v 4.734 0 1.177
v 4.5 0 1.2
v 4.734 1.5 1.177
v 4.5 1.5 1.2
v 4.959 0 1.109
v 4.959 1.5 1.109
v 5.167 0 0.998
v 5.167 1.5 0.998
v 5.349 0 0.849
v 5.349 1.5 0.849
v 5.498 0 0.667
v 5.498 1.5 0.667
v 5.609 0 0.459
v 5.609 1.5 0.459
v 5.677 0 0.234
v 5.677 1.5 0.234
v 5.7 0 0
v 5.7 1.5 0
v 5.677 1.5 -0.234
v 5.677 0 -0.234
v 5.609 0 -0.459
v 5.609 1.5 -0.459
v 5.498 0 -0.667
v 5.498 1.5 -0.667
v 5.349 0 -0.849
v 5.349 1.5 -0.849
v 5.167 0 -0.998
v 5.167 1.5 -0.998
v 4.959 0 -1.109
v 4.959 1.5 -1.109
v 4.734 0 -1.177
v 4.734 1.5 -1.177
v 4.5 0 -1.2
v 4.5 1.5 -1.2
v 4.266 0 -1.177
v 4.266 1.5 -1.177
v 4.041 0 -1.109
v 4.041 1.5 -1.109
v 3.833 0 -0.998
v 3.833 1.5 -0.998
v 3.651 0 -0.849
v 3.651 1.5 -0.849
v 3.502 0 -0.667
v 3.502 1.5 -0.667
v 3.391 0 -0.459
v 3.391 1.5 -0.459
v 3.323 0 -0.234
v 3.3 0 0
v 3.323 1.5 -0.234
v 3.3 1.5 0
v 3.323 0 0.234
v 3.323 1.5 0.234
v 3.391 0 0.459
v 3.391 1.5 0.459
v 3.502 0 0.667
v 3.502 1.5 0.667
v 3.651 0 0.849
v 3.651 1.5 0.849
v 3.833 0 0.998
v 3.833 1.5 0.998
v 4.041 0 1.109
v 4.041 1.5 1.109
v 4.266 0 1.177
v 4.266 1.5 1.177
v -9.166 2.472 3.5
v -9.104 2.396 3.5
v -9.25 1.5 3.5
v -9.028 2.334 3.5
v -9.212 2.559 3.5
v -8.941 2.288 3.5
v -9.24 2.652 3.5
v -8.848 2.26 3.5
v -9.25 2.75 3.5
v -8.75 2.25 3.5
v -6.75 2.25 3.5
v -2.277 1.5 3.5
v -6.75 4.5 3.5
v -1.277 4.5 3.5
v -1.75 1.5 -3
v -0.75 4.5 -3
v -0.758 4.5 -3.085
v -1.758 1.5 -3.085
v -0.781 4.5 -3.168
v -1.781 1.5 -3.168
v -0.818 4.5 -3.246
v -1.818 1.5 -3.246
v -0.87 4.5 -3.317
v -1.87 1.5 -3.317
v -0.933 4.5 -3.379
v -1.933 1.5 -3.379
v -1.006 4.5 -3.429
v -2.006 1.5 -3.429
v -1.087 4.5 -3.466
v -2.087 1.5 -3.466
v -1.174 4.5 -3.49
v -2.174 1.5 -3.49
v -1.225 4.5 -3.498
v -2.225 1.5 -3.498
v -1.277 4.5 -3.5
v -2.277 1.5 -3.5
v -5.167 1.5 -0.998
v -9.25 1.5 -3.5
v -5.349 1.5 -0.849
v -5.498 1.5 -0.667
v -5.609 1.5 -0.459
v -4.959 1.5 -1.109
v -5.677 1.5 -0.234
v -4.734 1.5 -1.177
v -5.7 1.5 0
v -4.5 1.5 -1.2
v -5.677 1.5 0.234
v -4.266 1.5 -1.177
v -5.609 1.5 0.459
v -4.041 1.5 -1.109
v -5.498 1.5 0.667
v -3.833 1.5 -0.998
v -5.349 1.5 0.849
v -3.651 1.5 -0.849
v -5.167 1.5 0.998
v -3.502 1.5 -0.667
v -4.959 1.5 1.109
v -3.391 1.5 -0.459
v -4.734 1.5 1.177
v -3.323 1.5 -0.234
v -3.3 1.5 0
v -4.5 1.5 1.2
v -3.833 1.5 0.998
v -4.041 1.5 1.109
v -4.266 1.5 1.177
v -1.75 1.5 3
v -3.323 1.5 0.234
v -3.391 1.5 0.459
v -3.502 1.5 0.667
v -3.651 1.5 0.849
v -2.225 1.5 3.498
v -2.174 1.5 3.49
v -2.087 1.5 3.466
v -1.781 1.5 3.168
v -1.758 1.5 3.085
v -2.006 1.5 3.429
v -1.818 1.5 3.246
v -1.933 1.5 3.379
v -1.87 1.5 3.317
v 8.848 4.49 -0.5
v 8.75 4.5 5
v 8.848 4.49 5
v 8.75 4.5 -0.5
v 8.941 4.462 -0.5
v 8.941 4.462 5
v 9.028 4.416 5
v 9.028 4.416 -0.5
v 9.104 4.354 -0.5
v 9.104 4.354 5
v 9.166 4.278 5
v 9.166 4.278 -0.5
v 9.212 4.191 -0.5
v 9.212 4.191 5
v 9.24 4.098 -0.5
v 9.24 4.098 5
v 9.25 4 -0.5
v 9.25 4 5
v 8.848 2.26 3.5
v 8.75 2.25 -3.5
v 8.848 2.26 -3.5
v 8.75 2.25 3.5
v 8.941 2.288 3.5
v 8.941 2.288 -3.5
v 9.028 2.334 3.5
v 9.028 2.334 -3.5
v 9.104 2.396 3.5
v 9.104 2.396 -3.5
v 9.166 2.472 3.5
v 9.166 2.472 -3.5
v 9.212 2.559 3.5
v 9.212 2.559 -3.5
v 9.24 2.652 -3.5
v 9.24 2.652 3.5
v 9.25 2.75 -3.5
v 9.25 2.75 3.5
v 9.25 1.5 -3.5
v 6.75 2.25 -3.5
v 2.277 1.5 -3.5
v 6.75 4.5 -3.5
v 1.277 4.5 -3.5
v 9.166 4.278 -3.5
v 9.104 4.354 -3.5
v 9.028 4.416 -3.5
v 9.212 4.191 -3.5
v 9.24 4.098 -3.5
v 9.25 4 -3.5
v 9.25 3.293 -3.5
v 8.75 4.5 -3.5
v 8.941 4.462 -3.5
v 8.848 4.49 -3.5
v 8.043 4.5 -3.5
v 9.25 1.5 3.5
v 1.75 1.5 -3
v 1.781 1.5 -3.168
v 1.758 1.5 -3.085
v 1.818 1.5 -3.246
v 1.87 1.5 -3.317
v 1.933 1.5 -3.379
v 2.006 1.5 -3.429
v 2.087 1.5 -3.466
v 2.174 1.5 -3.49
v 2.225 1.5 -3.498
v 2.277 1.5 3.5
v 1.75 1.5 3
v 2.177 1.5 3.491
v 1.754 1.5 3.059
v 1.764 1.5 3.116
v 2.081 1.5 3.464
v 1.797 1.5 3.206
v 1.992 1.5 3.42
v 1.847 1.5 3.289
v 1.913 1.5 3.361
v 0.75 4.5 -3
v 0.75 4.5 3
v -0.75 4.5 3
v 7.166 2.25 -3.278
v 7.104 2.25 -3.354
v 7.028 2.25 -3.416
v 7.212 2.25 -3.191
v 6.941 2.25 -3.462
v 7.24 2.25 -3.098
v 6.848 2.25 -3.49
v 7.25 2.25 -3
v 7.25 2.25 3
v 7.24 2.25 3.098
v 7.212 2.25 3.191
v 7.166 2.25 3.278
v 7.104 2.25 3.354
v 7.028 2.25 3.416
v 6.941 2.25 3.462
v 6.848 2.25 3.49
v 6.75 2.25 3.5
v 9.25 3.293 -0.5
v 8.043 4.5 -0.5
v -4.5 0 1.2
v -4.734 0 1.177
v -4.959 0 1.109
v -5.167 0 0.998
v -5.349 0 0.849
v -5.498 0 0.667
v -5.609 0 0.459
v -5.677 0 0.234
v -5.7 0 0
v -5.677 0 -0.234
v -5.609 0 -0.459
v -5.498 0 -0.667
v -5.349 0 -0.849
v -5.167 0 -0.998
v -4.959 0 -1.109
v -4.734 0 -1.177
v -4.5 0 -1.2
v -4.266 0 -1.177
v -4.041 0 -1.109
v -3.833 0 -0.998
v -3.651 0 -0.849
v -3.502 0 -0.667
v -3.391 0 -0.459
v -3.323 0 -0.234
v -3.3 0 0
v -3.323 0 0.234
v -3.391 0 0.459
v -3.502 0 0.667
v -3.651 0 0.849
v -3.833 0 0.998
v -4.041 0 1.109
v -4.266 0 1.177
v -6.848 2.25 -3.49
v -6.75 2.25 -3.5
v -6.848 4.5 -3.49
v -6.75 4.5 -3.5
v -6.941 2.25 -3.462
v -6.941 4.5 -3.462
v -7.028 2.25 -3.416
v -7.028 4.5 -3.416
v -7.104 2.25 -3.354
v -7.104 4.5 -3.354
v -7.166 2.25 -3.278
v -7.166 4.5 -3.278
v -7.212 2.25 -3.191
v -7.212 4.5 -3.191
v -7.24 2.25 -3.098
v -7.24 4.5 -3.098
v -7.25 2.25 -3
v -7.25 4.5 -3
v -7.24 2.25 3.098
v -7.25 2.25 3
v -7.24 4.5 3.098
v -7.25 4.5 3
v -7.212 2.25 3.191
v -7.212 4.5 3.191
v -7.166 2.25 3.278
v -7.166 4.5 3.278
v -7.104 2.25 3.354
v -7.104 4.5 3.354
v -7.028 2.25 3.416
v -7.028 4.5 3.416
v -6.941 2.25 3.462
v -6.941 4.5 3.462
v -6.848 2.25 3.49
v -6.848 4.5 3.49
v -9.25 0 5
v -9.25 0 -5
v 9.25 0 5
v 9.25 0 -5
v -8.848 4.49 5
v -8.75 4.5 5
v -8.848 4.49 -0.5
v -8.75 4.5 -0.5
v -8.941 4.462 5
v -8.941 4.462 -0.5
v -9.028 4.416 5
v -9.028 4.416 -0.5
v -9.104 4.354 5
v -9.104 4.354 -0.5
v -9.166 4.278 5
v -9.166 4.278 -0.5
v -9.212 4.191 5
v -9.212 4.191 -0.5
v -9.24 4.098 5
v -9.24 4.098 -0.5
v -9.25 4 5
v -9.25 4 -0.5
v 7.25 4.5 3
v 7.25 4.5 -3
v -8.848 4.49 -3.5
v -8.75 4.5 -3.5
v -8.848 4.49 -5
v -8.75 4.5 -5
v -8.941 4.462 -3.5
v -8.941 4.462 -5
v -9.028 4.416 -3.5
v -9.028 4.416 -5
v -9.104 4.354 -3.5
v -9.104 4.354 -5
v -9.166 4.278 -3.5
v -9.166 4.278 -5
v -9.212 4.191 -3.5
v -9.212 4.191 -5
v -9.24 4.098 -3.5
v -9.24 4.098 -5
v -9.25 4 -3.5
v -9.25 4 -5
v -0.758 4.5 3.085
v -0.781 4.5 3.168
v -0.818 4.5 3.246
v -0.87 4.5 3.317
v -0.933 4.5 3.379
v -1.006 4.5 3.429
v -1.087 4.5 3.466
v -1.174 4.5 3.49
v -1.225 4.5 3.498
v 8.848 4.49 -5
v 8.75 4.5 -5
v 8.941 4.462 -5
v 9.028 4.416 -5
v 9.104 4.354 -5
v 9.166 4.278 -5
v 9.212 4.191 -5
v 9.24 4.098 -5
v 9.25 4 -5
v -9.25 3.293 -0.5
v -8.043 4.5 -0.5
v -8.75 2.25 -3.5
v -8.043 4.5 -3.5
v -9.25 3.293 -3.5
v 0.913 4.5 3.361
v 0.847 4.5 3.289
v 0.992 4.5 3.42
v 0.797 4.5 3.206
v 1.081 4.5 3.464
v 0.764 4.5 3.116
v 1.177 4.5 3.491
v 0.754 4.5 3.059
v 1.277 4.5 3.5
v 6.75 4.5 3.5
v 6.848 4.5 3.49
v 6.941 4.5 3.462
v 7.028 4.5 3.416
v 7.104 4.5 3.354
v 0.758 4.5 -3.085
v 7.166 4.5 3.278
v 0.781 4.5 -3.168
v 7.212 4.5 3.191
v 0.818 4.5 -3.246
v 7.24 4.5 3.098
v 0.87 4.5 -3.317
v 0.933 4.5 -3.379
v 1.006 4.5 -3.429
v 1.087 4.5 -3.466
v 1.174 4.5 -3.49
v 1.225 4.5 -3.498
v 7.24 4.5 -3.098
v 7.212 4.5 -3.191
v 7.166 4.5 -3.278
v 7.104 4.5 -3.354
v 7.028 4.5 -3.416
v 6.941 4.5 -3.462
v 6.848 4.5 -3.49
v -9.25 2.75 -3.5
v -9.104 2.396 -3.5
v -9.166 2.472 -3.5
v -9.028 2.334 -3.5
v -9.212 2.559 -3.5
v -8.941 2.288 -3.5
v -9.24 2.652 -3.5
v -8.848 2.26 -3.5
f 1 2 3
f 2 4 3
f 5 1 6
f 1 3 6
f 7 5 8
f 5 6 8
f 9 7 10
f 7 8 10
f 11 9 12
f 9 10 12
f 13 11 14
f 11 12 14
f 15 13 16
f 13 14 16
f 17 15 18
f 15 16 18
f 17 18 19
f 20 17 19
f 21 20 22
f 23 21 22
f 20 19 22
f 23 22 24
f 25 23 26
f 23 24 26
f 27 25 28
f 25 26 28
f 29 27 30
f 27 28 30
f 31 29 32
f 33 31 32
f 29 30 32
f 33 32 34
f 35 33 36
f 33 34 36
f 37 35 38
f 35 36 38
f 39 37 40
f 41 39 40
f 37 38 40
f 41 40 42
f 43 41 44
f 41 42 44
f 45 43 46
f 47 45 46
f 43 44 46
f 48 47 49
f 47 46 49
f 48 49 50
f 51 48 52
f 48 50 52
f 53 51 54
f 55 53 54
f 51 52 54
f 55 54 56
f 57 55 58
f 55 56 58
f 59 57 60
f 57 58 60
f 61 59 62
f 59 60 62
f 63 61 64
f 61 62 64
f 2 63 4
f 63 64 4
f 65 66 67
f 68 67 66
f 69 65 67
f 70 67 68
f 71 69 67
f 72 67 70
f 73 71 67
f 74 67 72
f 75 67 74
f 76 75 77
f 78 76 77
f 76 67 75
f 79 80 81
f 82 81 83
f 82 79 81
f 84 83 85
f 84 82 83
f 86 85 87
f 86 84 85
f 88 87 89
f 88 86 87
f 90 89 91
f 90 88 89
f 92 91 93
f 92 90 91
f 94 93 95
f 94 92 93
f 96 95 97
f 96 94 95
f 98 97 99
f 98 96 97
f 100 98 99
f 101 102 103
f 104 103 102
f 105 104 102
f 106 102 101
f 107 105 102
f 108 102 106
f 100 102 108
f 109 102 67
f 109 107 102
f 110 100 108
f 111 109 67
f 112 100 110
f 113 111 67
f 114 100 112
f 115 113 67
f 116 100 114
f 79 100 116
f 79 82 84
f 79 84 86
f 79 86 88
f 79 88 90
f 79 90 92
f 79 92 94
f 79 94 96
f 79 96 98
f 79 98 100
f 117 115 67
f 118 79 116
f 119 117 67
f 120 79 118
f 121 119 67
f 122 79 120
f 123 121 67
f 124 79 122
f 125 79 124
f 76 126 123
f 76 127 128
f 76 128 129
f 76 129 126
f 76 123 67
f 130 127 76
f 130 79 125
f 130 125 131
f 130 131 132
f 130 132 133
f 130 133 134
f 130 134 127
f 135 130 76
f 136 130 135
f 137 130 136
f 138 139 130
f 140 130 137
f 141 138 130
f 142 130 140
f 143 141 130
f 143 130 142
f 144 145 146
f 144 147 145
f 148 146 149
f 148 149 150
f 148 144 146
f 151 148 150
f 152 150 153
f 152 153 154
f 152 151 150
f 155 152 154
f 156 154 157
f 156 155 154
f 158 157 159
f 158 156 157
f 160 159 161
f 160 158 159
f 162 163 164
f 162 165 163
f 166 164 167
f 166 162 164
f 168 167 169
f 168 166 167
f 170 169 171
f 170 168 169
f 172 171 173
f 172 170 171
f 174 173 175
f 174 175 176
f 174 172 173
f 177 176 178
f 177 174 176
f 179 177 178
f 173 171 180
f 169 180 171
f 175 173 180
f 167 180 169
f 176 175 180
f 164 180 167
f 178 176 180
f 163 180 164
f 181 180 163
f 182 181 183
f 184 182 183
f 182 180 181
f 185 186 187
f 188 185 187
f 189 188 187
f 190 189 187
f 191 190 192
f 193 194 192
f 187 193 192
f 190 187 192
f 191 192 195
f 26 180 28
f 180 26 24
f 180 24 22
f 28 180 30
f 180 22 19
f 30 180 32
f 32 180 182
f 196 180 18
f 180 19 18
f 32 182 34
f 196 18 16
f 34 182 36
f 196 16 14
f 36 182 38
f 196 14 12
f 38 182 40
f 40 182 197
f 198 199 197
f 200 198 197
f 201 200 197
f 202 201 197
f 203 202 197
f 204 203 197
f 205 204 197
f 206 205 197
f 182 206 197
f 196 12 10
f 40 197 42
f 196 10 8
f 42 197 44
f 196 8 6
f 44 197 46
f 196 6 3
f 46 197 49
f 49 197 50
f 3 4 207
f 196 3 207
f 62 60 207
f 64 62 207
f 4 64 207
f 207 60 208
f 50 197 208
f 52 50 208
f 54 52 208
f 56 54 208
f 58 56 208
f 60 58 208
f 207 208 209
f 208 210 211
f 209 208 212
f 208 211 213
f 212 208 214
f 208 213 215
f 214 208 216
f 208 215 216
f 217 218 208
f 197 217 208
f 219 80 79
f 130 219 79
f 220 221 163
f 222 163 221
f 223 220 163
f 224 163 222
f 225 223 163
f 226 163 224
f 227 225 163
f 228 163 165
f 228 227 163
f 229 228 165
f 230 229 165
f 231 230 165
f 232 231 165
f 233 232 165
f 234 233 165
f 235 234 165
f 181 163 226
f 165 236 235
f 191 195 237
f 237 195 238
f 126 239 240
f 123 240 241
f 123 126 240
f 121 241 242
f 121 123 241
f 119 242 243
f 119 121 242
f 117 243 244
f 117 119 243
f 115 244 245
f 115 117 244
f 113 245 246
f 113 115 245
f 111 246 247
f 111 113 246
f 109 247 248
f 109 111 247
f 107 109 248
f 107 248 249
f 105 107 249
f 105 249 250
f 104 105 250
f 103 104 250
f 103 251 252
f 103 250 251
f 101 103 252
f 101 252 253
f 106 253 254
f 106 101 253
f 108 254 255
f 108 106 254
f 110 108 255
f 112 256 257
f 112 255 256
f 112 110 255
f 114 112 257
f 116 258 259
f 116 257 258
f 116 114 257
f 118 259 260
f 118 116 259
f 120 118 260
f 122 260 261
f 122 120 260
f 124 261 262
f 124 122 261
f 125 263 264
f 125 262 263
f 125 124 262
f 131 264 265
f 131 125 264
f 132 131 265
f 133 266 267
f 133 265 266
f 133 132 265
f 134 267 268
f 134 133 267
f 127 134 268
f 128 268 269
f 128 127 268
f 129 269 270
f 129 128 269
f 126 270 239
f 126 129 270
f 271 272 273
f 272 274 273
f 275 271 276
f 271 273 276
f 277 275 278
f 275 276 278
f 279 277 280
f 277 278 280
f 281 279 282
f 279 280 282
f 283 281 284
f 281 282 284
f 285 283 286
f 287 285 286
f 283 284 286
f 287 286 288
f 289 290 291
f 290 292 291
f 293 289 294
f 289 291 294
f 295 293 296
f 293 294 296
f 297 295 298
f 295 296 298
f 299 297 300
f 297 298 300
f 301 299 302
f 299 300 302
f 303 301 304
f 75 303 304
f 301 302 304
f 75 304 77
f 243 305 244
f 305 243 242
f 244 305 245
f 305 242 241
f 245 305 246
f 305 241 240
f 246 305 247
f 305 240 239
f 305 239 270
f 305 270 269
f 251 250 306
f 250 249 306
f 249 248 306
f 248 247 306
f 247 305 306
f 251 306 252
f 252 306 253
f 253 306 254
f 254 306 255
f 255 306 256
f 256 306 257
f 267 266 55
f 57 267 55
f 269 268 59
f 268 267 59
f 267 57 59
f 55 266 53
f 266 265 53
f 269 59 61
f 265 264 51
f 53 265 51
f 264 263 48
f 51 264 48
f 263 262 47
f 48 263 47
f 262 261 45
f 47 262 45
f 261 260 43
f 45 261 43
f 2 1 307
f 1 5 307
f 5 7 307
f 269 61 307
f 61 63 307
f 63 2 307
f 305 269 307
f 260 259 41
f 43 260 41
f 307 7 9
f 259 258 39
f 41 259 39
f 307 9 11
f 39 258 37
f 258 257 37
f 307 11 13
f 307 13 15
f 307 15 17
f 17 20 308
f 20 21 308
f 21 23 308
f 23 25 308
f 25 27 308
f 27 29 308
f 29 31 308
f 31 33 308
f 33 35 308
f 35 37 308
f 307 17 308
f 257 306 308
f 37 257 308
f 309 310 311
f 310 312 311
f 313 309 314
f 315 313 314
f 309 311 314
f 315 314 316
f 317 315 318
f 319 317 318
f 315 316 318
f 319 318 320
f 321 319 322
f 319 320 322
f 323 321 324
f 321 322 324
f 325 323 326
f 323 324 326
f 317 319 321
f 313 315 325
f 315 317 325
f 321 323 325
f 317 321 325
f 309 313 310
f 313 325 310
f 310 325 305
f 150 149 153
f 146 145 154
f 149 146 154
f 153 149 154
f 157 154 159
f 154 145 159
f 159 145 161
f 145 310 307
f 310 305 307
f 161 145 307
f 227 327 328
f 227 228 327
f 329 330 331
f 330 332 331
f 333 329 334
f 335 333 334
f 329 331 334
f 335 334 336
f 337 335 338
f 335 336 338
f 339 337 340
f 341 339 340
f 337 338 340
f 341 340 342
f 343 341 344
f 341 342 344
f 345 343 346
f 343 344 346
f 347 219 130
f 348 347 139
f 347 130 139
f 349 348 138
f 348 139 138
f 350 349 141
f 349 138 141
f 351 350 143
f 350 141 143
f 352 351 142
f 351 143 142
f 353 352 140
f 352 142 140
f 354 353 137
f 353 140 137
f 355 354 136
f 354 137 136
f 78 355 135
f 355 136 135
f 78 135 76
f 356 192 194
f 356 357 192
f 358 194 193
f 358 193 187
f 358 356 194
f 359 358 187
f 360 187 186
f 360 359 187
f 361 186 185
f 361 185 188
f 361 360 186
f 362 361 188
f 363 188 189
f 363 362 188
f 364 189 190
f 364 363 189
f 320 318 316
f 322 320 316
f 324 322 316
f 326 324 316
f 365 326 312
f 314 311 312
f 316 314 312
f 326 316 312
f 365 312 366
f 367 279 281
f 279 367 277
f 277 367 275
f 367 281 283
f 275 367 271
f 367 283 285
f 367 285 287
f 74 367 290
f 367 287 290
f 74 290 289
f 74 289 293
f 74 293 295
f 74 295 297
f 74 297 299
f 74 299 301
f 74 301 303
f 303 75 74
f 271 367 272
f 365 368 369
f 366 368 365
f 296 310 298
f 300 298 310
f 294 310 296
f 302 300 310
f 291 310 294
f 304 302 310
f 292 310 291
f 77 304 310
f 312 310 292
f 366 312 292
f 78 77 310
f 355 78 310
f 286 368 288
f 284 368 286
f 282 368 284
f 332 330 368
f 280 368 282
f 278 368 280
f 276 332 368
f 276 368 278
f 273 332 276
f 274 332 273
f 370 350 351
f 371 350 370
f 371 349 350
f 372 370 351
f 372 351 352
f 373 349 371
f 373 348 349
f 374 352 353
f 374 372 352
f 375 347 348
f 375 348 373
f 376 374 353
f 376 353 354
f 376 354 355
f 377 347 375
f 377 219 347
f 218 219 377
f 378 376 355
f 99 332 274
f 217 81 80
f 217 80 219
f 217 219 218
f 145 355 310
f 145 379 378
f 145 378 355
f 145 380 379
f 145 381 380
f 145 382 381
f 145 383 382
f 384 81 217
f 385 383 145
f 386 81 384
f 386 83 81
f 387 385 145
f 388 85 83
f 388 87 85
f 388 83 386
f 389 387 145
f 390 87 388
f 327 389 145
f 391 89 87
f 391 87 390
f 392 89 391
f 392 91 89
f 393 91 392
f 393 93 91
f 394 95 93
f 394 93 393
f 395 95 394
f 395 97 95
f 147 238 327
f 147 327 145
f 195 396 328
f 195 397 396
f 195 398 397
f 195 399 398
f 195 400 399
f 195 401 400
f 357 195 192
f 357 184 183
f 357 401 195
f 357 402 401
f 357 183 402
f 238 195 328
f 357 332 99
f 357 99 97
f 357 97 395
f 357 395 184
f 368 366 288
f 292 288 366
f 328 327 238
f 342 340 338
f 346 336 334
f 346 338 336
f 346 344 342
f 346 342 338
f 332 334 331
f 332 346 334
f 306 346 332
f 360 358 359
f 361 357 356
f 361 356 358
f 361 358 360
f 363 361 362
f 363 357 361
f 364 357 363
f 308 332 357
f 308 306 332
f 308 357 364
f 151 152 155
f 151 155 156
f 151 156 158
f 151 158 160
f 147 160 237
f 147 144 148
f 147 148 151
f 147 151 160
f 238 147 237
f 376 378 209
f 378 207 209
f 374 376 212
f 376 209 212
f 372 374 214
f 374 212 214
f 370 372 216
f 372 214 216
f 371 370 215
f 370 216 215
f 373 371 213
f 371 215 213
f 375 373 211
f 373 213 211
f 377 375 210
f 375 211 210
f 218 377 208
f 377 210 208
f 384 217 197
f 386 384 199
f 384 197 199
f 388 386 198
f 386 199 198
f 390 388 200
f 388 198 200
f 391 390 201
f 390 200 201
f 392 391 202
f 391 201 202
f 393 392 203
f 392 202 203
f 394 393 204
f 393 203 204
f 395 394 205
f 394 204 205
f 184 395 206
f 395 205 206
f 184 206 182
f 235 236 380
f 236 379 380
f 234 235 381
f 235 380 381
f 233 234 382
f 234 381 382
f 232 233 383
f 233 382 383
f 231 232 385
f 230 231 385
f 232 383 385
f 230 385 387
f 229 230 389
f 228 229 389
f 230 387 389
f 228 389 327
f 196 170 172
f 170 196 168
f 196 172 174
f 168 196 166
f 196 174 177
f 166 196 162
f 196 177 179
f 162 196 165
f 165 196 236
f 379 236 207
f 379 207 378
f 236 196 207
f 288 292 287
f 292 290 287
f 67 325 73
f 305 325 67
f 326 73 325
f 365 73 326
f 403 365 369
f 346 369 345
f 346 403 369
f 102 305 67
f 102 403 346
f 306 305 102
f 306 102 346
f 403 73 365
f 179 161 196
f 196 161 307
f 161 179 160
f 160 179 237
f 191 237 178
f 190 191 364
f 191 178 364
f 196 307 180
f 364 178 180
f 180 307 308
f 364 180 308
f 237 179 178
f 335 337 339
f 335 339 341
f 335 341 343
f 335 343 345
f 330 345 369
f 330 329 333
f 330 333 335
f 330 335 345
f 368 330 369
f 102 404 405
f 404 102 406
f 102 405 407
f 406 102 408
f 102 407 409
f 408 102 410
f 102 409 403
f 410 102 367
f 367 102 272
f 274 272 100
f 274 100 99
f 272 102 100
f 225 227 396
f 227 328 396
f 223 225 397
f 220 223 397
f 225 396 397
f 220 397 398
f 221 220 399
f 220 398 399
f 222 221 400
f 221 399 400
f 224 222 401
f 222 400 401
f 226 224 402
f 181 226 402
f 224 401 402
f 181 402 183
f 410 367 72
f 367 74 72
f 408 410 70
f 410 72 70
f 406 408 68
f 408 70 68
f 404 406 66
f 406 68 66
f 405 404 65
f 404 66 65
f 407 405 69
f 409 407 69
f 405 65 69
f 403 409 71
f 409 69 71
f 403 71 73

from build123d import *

# Parameters (mm, degrees)
SKETCH1_W           = 18.5
SKETCH1_H           = 10
SKETCH1_W_2         = 5.5
SKETCH1_H_2         = 7
BOSS_EXTRUDE1_DEPTH = 1.5
SKETCH1_3_W         = 18.5
SKETCH1_3_H         = 10
SKETCH1_3_W_2       = 5.5
SKETCH1_3_H_2       = 7
BOSS_EXTRUDE2_DEPTH = 4.5
CUT_EXTRUDE1_START  = -2
SKETCH2_W           = 7
SKETCH2_H           = 0.75
CUT_EXTRUDE1_DEPTH  = 2
CUT_EXTRUDE5_START  = -16.5
SKETCH2_2_W         = 7
SKETCH2_2_H         = 0.75
CUT_EXTRUDE5_DEPTH  = 2
SKETCH4_W           = 3
SKETCH4_H           = 2.690114405
CUT_EXTRUDE3_DEPTH  = 12.437329234
CHAMFER1_SIZE       = 1
CHAMFER1_SIZE_2     = 3
FILLET2_R           = 0.5


with BuildPart() as part:
    # Sketch1 → Boss-Extrude1 (new body)
    # profile 1 of 3: a face of its own
    with BuildSketch(Plane(origin=(0, 0, 0), x_dir=(1, 0, 0), z_dir=(0, 1, 0))):
        Rectangle(SKETCH1_W, SKETCH1_H)
        with Locations((4.5, 0)):
            Rectangle(SKETCH1_W_2, SKETCH1_H_2, mode=Mode.SUBTRACT)
        with Locations((-4.5, 0)):
            Rectangle(SKETCH1_W_2, SKETCH1_H_2, mode=Mode.SUBTRACT)
    # profile 2 of 3: a face of its own
    with BuildSketch(Plane(origin=(0, 0, 0), x_dir=(1, 0, 0), z_dir=(0, 1, 0))):
        with Locations((4.5, 0)):
            Rectangle(SKETCH1_W_2, SKETCH1_H_2)
    # profile 3 of 3: a face of its own
    with BuildSketch(Plane(origin=(0, 0, 0), x_dir=(1, 0, 0), z_dir=(0, 1, 0))):
        with Locations((-4.5, 0)):
            Rectangle(SKETCH1_W_2, SKETCH1_H_2)
    extrude(amount=BOSS_EXTRUDE1_DEPTH)

    # Sketch1<3> → Boss-Extrude2 (add)
    with BuildSketch(Plane(origin=(0, 0, 0), x_dir=(1, 0, 0), z_dir=(0, 1, 0))):
        Rectangle(SKETCH1_3_W, SKETCH1_3_H)
        with Locations((-4.5, 0)):
            Rectangle(SKETCH1_3_W_2, SKETCH1_3_H_2, mode=Mode.SUBTRACT)
        with Locations((4.5, 0)):
            Rectangle(SKETCH1_3_W_2, SKETCH1_3_H_2, mode=Mode.SUBTRACT)
    extrude(amount=BOSS_EXTRUDE2_DEPTH)

    # Sketch2 → Cut-Extrude1 (cut)
    with BuildSketch(Plane.ZY.offset(9.25).offset(CUT_EXTRUDE1_START)):
        with Locations((0, 1.875)):
            Rectangle(SKETCH2_W, SKETCH2_H)
    extrude(amount=CUT_EXTRUDE1_DEPTH, mode=Mode.SUBTRACT)

    # Sketch2<2> → Cut-Extrude5 (cut)
    with BuildSketch(Plane.ZY.offset(9.25).offset(CUT_EXTRUDE5_START)):
        with Locations((0, 1.875)):
            Rectangle(SKETCH2_2_W, SKETCH2_2_H)
    extrude(amount=-CUT_EXTRUDE5_DEPTH, mode=Mode.SUBTRACT)

    # Sketch4 → Cut-Extrude3 (cut, symmetric)
    with BuildSketch(Plane(origin=(0, 0, 0), x_dir=(0, 0, 1), z_dir=(0.7071067811865488, 0.7071067811865464, 0))):
        with Locations((-2, -10.214222054)):
            Rectangle(SKETCH4_W, SKETCH4_H)
    cut_extrude3 = extrude(amount=CUT_EXTRUDE3_DEPTH, both=True, mode=Mode.SUBTRACT)

    # Sketch5 → M2 Clearance Hole1 (revolve, cut)
    with BuildSketch(Plane(origin=(-4.5, 1.5, 0), x_dir=(0, 0, 1), z_dir=(1, 0, 0))):
        Polygon((0, 0), (0, 2.321032743), (1.2, 1.6), (1.2, 0), align=None)
    m2_clearance_hole1 = revolve(axis=Axis((-4.5, 7.85, 0), (0, -1, 0)), mode=Mode.SUBTRACT)

    # Mirror4: Cut-Extrude3, M2 Clearance Hole1 across plane
    add(cut_extrude3.mirror(Plane(origin=(0, 0, 0), x_dir=(0, 0, 1), z_dir=(1, 0, 0))), mode=Mode.SUBTRACT)
    add(m2_clearance_hole1.mirror(Plane(origin=(0, 0, 0), x_dir=(0, 0, 1), z_dir=(1, 0, 0))), mode=Mode.SUBTRACT)

    # Chamfer1
    # the kernel refuses this chamfer: 3, 1 mm, written as the material it takes off along each edge
    with BuildSketch(Plane(origin=(-1.75, 4.5, -3.5), x_dir=(0.9940388851139268, 0.10902612017980688, 0), z_dir=(0, 0, 1)), Plane(origin=(1.75, 4.5, 3.5), x_dir=(-0.9940388851139268, 0.10902612017980688, 0), z_dir=(0, 0, -1))) as chamfer1_piece_1:
        Polygon((CHAMFER1_SIZE * 0.994038885114, -CHAMFER1_SIZE * 0.10902612018), (-CHAMFER1_SIZE_2 * 0.10902612018, -CHAMFER1_SIZE_2 * 0.994038885114), (0, 0), align=None)
    extrude(amount=7, mode=Mode.SUBTRACT)

    # Fillet2
    fillet2_edges = [part.edges().sort_by_distance(p)[0] for p in [
        (9.25, 4.5, -4.25),
        (1.25, 3, 3.5),
        (1.25, 3, -3.5),
        (-1.25, 3, -3.5),
        (-1.25, 3, 3.5),
        (-9.25, 4.5, -4.25),
        (9.25, 4.5, 2.25),
        (-7.25, 3.375, 3.5),
        (-7.25, 3.375, -3.5),
        (7.25, 3.375, 3.5),
        (7.25, 3.375, -3.5),
        (-9.25, 2.25, 0),
        (9.25, 2.25, 0),
        (-9.25, 4.5, 2.25),
    ]]
    fillet(fillet2_edges, radius=FILLET2_R)


solid = part.part
